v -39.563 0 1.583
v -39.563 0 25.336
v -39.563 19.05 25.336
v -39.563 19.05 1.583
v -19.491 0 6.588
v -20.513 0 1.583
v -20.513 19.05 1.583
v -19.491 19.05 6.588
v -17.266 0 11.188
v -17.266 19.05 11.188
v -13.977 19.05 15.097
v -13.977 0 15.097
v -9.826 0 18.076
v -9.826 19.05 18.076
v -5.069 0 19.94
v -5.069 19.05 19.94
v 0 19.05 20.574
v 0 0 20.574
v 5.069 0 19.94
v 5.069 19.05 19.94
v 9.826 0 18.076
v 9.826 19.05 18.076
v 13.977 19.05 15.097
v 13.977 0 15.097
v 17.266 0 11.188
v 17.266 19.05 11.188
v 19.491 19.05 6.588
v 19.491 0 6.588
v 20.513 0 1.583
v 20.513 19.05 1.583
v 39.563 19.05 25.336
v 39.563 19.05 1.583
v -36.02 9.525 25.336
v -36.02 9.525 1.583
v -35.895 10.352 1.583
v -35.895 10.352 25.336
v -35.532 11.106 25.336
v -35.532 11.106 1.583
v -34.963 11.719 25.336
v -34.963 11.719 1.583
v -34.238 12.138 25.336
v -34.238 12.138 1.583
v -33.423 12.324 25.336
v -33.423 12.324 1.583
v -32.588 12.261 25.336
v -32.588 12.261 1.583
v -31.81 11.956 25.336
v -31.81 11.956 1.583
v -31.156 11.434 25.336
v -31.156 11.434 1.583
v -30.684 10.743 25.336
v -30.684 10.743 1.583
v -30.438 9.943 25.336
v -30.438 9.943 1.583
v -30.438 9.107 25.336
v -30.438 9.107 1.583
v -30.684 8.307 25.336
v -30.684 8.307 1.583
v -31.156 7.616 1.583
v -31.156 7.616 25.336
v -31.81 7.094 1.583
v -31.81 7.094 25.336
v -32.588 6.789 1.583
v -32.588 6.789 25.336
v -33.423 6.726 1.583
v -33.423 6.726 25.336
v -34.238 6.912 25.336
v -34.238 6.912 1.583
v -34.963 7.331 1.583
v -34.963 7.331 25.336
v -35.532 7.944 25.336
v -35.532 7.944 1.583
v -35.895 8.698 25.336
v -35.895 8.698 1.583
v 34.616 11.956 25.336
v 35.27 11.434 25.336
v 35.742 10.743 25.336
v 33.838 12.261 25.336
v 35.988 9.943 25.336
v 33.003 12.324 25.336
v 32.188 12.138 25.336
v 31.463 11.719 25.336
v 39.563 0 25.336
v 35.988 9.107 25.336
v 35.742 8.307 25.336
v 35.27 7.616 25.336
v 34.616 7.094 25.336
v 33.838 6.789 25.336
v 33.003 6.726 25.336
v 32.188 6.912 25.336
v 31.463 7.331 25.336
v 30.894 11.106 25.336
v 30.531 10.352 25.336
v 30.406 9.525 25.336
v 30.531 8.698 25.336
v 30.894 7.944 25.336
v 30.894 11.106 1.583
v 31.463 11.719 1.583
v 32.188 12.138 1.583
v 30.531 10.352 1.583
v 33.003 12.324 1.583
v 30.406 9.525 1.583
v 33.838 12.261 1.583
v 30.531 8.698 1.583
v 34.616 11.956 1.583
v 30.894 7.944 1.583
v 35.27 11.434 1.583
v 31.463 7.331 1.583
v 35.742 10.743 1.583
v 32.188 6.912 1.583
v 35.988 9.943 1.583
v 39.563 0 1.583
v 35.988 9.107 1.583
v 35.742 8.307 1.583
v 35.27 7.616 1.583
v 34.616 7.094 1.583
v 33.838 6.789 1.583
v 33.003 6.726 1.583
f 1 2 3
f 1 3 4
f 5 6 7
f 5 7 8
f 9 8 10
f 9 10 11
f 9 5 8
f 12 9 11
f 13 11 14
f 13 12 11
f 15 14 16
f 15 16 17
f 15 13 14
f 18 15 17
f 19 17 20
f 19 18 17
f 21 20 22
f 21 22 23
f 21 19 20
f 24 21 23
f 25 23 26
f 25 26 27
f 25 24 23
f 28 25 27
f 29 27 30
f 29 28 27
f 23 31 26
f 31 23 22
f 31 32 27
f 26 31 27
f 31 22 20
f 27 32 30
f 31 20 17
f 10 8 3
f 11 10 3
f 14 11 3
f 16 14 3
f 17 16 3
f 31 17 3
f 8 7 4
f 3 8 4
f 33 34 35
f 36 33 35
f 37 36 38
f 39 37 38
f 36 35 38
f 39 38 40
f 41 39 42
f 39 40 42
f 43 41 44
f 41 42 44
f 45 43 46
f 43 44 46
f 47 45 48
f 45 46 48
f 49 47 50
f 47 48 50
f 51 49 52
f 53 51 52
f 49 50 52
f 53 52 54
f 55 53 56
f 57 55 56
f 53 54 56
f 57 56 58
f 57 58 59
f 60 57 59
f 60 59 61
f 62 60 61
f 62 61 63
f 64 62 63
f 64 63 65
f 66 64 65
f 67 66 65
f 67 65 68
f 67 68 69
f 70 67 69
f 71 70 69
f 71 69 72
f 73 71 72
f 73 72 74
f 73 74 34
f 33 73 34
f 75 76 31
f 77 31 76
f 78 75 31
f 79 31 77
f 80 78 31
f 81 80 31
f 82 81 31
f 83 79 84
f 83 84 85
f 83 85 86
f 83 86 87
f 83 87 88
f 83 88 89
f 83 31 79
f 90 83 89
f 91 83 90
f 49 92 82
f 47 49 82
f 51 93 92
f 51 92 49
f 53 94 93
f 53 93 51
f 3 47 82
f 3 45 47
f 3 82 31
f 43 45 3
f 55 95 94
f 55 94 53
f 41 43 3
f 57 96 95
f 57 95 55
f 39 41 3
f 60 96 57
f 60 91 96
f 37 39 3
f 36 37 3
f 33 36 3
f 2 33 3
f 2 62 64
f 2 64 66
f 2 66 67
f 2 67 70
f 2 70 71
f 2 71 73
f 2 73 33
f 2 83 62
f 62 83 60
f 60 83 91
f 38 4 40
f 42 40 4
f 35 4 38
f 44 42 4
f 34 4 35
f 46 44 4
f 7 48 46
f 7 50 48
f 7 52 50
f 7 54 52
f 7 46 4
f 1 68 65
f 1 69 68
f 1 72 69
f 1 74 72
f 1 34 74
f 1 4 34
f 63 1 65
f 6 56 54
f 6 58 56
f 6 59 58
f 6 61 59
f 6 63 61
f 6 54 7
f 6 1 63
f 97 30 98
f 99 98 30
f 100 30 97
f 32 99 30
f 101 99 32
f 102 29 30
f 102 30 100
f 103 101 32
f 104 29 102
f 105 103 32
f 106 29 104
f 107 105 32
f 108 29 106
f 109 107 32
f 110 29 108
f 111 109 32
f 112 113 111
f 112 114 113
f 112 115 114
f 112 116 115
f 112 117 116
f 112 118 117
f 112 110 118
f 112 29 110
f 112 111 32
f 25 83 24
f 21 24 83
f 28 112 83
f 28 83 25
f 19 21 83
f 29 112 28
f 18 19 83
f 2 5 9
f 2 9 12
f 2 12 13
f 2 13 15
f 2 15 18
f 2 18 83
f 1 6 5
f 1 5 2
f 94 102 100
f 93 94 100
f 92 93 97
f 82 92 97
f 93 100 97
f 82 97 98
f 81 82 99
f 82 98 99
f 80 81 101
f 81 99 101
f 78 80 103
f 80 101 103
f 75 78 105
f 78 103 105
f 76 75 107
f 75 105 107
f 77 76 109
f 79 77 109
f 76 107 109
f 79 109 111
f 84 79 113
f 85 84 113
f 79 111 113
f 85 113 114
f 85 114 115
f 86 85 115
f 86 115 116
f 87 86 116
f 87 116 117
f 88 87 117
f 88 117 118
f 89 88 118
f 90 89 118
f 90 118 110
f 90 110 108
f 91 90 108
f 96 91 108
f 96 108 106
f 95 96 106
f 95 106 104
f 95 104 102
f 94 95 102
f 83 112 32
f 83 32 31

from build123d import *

# Parameters (mm, degrees)
BOSS_EXTRUDE1_DEPTH    = 19.05
SKETCH2_R              = 1.27
CUT_EXTRUDE1_DEPTH     = 50.92377848
F_10_CLEARANCE_HOLE1_D = 5.6134


with BuildPart() as part:
    # Sketch1 → Boss-Extrude1 (new body)
    with BuildSketch(Plane(origin=(0, 0, 0), x_dir=(1, 0, 0), z_dir=(0, 1, 0))):
        with BuildLine():
            Line((39.563039866, -1.582615385), (39.563039866, -25.3365))
            Line((39.563039866, -25.3365), (-39.563039866, -25.3365))
            Line((-39.563039866, -25.3365), (-39.563039866, -1.582615385))
            Line((-39.563039866, -1.582615385), (-20.513039866, -1.582615385))
            ThreePointArc((-20.513039866, -1.582615385), (0, -20.574), (20.513039866, -1.582615385))
            Line((20.513039866, -1.582615385), (39.563039866, -1.582615385))
        make_face()
    extrude(amount=BOSS_EXTRUDE1_DEPTH)

    # Sketch2 → Cut-Extrude1 (cut, through all)
    with BuildSketch(Plane.XY.offset(25.3365)):
        with Locations((33.213039866, 9.525)):
            Circle(SKETCH2_R)
        with Locations((-33.213039866, 9.525)):
            Circle(SKETCH2_R)
    extrude(amount=-CUT_EXTRUDE1_DEPTH, mode=Mode.SUBTRACT)

    # #10 Clearance Hole1 (through all)
    with Locations(Plane.XY.offset(25.3365)):
        with Locations((-33.213039866, 9.525), (33.213039866, 9.525)):
            Hole(F_10_CLEARANCE_HOLE1_D / 2)


solid = part.part
